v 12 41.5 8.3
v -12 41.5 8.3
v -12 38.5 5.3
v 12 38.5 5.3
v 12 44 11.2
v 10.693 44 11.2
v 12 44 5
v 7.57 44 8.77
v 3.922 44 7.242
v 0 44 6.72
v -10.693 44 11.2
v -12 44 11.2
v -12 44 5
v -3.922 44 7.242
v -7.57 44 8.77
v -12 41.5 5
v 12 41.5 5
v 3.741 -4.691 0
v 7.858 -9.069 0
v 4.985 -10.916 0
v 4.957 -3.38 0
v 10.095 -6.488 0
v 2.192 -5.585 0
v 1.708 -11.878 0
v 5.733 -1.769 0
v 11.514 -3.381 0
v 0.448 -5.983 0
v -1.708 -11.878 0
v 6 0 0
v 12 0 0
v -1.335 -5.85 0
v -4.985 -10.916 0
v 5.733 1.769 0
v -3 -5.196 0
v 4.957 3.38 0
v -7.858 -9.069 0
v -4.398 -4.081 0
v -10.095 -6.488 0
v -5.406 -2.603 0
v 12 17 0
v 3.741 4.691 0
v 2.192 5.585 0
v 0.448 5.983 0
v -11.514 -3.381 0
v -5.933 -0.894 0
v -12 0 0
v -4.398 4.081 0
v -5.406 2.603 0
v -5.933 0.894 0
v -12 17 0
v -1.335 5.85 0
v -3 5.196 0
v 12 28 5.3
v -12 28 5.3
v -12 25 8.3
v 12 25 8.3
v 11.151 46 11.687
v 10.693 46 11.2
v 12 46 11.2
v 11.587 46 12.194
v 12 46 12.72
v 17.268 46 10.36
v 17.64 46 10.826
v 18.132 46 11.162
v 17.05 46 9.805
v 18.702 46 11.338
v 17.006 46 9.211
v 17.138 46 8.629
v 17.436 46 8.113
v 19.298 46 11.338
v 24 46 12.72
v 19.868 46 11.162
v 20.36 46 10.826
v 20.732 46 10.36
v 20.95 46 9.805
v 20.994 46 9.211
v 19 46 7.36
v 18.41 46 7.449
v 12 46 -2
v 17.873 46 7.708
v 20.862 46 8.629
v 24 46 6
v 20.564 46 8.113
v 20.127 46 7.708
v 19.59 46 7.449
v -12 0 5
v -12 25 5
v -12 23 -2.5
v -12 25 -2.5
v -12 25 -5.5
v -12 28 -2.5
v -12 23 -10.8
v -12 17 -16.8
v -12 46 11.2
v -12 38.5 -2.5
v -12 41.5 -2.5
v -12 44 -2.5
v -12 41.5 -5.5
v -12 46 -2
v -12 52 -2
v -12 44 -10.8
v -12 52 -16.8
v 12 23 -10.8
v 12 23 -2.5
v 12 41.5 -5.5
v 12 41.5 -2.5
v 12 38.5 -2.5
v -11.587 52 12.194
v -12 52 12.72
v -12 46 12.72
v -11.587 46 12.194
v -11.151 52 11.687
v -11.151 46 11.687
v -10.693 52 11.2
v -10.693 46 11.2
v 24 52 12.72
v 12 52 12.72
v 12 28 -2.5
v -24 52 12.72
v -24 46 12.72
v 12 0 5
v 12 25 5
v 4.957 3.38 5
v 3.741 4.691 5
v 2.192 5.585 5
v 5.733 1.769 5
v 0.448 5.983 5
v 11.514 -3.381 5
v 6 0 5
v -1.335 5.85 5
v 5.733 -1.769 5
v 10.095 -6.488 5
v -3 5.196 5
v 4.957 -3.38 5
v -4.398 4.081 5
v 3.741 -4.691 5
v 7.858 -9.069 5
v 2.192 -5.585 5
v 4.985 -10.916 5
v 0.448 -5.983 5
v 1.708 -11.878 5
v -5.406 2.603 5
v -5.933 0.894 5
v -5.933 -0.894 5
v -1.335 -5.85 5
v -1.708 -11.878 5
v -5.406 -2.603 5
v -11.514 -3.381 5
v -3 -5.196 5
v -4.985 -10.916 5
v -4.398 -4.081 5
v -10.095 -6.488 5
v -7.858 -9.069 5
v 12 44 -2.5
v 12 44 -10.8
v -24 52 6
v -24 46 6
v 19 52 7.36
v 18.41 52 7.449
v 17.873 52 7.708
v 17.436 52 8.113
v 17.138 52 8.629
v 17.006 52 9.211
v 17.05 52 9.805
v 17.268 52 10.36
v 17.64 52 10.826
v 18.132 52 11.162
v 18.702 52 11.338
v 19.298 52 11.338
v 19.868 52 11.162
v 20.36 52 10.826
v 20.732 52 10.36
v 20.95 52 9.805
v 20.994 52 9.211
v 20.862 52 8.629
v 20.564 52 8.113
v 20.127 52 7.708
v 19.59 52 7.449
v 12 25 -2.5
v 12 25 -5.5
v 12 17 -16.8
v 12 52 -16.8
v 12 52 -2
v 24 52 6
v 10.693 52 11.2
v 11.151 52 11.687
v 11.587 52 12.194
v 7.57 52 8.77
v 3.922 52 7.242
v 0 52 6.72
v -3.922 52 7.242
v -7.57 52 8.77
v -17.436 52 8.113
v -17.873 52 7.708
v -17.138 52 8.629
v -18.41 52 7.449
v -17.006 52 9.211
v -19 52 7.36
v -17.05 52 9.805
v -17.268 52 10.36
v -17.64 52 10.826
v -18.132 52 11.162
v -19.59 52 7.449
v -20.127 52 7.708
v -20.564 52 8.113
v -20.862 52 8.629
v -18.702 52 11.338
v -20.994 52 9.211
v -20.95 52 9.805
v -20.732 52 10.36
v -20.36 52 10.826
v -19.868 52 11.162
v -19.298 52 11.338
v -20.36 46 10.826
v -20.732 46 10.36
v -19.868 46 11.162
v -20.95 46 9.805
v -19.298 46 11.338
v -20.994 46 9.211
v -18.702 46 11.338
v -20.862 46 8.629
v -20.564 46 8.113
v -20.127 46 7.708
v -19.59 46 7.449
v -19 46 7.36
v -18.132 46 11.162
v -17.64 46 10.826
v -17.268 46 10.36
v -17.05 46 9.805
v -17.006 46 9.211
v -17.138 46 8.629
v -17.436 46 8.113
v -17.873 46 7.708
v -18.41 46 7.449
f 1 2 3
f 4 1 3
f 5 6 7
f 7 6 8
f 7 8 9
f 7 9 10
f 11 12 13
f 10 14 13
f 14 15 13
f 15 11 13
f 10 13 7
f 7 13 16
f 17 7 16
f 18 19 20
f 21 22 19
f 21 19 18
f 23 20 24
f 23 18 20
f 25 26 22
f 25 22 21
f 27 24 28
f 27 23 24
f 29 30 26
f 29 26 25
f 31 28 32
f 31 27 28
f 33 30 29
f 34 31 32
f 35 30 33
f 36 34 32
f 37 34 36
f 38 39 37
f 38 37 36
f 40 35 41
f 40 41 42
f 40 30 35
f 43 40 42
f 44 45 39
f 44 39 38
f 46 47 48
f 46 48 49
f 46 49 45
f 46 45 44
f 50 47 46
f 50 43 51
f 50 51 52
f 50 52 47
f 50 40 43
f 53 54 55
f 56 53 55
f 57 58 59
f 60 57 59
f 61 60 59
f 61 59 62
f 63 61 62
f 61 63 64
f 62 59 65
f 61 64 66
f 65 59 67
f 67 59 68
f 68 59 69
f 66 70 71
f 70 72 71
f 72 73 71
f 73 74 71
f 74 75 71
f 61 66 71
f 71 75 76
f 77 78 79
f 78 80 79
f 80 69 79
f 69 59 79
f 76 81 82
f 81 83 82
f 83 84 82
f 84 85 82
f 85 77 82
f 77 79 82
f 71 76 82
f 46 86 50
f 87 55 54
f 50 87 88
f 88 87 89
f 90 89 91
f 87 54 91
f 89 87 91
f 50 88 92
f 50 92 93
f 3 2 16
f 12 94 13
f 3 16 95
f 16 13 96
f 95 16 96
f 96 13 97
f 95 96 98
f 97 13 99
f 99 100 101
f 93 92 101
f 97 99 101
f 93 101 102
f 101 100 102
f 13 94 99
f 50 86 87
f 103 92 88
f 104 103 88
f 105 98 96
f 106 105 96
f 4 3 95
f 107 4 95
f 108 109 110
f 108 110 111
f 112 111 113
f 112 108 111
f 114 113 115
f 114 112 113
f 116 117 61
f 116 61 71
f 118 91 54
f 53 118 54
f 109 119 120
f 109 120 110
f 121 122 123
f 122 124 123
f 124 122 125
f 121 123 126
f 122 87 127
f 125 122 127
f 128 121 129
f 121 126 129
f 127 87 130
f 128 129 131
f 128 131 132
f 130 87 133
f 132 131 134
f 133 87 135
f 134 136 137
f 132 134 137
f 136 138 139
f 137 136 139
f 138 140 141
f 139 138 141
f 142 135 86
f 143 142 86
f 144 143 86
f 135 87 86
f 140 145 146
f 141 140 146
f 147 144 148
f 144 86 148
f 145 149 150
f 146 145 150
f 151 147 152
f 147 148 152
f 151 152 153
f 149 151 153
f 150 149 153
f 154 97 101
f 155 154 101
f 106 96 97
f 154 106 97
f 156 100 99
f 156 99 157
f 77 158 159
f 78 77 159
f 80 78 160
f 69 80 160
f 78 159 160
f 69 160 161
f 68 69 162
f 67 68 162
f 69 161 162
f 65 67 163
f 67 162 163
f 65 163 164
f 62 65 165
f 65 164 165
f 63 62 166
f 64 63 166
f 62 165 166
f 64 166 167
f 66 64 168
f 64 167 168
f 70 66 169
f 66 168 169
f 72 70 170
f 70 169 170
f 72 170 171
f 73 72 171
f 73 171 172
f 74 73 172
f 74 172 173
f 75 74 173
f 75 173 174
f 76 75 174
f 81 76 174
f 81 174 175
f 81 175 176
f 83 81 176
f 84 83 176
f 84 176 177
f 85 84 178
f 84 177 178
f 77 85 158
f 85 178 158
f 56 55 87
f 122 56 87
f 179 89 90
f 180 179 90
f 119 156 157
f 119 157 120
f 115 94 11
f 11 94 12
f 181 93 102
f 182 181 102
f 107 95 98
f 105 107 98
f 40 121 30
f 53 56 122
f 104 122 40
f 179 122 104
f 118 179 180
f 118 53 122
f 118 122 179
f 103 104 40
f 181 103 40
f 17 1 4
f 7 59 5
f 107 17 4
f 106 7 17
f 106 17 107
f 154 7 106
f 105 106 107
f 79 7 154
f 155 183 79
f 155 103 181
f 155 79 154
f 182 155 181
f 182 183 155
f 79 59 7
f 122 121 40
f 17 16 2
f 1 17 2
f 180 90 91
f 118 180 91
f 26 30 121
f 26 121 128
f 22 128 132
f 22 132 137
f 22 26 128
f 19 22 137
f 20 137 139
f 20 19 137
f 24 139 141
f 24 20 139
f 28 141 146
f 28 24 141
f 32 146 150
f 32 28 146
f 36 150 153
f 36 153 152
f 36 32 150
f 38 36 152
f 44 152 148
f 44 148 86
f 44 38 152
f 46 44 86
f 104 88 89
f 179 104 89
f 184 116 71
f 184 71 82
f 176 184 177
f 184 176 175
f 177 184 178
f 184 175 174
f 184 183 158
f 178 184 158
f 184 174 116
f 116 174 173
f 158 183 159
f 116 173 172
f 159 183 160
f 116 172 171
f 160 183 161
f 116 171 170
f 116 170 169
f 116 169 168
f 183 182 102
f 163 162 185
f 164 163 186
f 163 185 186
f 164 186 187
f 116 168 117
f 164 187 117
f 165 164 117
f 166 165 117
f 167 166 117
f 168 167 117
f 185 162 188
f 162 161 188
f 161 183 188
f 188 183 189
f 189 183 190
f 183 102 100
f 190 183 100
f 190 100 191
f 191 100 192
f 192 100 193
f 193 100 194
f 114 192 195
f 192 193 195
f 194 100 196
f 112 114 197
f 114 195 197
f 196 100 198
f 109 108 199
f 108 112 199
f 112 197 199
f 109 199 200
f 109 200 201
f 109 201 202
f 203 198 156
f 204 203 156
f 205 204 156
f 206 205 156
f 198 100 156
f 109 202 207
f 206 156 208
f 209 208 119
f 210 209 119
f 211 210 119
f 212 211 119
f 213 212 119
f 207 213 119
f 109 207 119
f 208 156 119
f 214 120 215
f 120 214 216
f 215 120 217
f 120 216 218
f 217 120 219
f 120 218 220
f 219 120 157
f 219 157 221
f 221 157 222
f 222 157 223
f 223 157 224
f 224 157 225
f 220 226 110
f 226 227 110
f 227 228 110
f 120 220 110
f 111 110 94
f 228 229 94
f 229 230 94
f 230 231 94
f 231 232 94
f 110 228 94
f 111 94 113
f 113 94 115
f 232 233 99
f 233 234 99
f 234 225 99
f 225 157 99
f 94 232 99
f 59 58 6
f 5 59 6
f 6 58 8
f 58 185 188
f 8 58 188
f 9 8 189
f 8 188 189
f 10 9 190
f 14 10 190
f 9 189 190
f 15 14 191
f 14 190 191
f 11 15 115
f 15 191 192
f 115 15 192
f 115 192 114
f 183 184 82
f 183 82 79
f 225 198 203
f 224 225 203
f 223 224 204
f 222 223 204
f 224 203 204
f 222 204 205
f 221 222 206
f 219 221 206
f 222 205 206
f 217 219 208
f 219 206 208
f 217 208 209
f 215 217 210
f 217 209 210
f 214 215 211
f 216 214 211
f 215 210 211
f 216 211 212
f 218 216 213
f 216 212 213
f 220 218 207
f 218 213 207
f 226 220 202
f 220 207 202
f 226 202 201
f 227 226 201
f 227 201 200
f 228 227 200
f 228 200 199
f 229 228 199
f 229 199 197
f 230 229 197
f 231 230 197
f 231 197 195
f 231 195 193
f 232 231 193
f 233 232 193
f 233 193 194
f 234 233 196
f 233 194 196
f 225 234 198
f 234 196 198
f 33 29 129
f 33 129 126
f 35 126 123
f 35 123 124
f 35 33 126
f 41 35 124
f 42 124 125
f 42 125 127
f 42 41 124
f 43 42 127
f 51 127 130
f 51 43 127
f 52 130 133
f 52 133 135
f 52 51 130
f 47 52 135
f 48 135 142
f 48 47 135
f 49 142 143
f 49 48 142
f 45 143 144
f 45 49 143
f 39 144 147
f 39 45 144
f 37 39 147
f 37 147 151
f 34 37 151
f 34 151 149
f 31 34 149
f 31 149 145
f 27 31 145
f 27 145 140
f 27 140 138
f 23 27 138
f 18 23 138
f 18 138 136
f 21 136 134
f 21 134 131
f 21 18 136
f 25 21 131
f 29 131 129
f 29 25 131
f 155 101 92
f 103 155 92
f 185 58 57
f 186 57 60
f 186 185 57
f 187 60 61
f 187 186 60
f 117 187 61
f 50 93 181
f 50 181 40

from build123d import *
from build123d.topology import SkipClean

# Parameters (mm, degrees)
ESBO_O1_R                = 6
RESSALTO_EXTRUS_O1_DEPTH = 5
RESSALTO_EXTRUS_O2_DEPTH = 24
ESBO_O3_R                = 2
RESSALTO_EXTRUS_O3_DEPTH = 6
ESBO_O5_R                = 15
CORTE_EXTRUS_O1_DEPTH    = 10


with BuildPart() as part:
    # Esboço1 → Ressalto-extrusão1 (new body)
    with BuildSketch(Plane.XY):
        with BuildLine():
            Line((-12, 0), (-12, 17))
            Line((-12, 17), (12, 17))
            Line((12, 17), (12, 0))
            ThreePointArc((12, 0), (0, -12), (-12, 0))
        make_face()
        Circle(ESBO_O1_R, mode=Mode.SUBTRACT)
    extrude(amount=RESSALTO_EXTRUS_O1_DEPTH)

    # Esboço2 → Ressalto-extrusão2 (add)
    with BuildSketch(Plane.ZY.offset(12)):
        Polygon((5, 17), (0.2, 17), (-10.8, 17), (-16.8, 17), (-16.8, 52), (11.2, 52), (11.2, 44), (5, 44), (5, 41.5), (8.3, 41.5), (5.3, 38.5), (-2.5, 38.5), (-5.5, 41.5), (-2.5, 41.5), (-2.5, 44), (-10.8, 44), (-10.8, 23), (-2.5, 23), (-2.5, 25), (-5.5, 25), (-2.5, 28), (5.3, 28), (8.3, 25), (5, 25), align=None)
    extrude(amount=-RESSALTO_EXTRUS_O2_DEPTH)

    # Esboço3 → Ressalto-extrusão3 (add)
    with BuildSketch(Plane(origin=(0, 52, 0), x_dir=(1, 0, 0), z_dir=(0, 1, 0))):
        with BuildLine():
            Line((12, -6), (-12, -6))
            Line((-12, -6), (-12, 2))
            Line((-12, 2), (-24, -6))
            Line((-24, -6), (-24, -12.72))
            Line((-24, -12.72), (-12, -12.72))
            ThreePointArc((-12, -12.72), (0, -6.72), (12, -12.72))
            Line((12, -12.72), (24, -12.72))
            Line((24, -12.72), (24, -6))
            Line((24, -6), (12, 2))
            Line((12, 2), (12, -6))
        make_face()
        with Locations(Location((19, -9.36, 0), (0, 0, 90))):
            Circle(ESBO_O3_R, mode=Mode.SUBTRACT)
        with Locations(Location((-19, -9.36, 0), (0, 0, 90))):
            Circle(ESBO_O3_R, mode=Mode.SUBTRACT)
    extrude(amount=-RESSALTO_EXTRUS_O3_DEPTH)

    # Esboço5 → Corte-extrusão1 (cut)
    with SkipClean():  # the faces are left unmerged after this step: merging them gives an invalid solid
        with BuildSketch(Plane(origin=(0, 52, 0), x_dir=(1, 0, 0), z_dir=(0, 1, 0))):
            with Locations((0, -21.72)):
                Circle(ESBO_O5_R)
        extrude(amount=-CORTE_EXTRUS_O1_DEPTH, mode=Mode.SUBTRACT)


solid = part.part
